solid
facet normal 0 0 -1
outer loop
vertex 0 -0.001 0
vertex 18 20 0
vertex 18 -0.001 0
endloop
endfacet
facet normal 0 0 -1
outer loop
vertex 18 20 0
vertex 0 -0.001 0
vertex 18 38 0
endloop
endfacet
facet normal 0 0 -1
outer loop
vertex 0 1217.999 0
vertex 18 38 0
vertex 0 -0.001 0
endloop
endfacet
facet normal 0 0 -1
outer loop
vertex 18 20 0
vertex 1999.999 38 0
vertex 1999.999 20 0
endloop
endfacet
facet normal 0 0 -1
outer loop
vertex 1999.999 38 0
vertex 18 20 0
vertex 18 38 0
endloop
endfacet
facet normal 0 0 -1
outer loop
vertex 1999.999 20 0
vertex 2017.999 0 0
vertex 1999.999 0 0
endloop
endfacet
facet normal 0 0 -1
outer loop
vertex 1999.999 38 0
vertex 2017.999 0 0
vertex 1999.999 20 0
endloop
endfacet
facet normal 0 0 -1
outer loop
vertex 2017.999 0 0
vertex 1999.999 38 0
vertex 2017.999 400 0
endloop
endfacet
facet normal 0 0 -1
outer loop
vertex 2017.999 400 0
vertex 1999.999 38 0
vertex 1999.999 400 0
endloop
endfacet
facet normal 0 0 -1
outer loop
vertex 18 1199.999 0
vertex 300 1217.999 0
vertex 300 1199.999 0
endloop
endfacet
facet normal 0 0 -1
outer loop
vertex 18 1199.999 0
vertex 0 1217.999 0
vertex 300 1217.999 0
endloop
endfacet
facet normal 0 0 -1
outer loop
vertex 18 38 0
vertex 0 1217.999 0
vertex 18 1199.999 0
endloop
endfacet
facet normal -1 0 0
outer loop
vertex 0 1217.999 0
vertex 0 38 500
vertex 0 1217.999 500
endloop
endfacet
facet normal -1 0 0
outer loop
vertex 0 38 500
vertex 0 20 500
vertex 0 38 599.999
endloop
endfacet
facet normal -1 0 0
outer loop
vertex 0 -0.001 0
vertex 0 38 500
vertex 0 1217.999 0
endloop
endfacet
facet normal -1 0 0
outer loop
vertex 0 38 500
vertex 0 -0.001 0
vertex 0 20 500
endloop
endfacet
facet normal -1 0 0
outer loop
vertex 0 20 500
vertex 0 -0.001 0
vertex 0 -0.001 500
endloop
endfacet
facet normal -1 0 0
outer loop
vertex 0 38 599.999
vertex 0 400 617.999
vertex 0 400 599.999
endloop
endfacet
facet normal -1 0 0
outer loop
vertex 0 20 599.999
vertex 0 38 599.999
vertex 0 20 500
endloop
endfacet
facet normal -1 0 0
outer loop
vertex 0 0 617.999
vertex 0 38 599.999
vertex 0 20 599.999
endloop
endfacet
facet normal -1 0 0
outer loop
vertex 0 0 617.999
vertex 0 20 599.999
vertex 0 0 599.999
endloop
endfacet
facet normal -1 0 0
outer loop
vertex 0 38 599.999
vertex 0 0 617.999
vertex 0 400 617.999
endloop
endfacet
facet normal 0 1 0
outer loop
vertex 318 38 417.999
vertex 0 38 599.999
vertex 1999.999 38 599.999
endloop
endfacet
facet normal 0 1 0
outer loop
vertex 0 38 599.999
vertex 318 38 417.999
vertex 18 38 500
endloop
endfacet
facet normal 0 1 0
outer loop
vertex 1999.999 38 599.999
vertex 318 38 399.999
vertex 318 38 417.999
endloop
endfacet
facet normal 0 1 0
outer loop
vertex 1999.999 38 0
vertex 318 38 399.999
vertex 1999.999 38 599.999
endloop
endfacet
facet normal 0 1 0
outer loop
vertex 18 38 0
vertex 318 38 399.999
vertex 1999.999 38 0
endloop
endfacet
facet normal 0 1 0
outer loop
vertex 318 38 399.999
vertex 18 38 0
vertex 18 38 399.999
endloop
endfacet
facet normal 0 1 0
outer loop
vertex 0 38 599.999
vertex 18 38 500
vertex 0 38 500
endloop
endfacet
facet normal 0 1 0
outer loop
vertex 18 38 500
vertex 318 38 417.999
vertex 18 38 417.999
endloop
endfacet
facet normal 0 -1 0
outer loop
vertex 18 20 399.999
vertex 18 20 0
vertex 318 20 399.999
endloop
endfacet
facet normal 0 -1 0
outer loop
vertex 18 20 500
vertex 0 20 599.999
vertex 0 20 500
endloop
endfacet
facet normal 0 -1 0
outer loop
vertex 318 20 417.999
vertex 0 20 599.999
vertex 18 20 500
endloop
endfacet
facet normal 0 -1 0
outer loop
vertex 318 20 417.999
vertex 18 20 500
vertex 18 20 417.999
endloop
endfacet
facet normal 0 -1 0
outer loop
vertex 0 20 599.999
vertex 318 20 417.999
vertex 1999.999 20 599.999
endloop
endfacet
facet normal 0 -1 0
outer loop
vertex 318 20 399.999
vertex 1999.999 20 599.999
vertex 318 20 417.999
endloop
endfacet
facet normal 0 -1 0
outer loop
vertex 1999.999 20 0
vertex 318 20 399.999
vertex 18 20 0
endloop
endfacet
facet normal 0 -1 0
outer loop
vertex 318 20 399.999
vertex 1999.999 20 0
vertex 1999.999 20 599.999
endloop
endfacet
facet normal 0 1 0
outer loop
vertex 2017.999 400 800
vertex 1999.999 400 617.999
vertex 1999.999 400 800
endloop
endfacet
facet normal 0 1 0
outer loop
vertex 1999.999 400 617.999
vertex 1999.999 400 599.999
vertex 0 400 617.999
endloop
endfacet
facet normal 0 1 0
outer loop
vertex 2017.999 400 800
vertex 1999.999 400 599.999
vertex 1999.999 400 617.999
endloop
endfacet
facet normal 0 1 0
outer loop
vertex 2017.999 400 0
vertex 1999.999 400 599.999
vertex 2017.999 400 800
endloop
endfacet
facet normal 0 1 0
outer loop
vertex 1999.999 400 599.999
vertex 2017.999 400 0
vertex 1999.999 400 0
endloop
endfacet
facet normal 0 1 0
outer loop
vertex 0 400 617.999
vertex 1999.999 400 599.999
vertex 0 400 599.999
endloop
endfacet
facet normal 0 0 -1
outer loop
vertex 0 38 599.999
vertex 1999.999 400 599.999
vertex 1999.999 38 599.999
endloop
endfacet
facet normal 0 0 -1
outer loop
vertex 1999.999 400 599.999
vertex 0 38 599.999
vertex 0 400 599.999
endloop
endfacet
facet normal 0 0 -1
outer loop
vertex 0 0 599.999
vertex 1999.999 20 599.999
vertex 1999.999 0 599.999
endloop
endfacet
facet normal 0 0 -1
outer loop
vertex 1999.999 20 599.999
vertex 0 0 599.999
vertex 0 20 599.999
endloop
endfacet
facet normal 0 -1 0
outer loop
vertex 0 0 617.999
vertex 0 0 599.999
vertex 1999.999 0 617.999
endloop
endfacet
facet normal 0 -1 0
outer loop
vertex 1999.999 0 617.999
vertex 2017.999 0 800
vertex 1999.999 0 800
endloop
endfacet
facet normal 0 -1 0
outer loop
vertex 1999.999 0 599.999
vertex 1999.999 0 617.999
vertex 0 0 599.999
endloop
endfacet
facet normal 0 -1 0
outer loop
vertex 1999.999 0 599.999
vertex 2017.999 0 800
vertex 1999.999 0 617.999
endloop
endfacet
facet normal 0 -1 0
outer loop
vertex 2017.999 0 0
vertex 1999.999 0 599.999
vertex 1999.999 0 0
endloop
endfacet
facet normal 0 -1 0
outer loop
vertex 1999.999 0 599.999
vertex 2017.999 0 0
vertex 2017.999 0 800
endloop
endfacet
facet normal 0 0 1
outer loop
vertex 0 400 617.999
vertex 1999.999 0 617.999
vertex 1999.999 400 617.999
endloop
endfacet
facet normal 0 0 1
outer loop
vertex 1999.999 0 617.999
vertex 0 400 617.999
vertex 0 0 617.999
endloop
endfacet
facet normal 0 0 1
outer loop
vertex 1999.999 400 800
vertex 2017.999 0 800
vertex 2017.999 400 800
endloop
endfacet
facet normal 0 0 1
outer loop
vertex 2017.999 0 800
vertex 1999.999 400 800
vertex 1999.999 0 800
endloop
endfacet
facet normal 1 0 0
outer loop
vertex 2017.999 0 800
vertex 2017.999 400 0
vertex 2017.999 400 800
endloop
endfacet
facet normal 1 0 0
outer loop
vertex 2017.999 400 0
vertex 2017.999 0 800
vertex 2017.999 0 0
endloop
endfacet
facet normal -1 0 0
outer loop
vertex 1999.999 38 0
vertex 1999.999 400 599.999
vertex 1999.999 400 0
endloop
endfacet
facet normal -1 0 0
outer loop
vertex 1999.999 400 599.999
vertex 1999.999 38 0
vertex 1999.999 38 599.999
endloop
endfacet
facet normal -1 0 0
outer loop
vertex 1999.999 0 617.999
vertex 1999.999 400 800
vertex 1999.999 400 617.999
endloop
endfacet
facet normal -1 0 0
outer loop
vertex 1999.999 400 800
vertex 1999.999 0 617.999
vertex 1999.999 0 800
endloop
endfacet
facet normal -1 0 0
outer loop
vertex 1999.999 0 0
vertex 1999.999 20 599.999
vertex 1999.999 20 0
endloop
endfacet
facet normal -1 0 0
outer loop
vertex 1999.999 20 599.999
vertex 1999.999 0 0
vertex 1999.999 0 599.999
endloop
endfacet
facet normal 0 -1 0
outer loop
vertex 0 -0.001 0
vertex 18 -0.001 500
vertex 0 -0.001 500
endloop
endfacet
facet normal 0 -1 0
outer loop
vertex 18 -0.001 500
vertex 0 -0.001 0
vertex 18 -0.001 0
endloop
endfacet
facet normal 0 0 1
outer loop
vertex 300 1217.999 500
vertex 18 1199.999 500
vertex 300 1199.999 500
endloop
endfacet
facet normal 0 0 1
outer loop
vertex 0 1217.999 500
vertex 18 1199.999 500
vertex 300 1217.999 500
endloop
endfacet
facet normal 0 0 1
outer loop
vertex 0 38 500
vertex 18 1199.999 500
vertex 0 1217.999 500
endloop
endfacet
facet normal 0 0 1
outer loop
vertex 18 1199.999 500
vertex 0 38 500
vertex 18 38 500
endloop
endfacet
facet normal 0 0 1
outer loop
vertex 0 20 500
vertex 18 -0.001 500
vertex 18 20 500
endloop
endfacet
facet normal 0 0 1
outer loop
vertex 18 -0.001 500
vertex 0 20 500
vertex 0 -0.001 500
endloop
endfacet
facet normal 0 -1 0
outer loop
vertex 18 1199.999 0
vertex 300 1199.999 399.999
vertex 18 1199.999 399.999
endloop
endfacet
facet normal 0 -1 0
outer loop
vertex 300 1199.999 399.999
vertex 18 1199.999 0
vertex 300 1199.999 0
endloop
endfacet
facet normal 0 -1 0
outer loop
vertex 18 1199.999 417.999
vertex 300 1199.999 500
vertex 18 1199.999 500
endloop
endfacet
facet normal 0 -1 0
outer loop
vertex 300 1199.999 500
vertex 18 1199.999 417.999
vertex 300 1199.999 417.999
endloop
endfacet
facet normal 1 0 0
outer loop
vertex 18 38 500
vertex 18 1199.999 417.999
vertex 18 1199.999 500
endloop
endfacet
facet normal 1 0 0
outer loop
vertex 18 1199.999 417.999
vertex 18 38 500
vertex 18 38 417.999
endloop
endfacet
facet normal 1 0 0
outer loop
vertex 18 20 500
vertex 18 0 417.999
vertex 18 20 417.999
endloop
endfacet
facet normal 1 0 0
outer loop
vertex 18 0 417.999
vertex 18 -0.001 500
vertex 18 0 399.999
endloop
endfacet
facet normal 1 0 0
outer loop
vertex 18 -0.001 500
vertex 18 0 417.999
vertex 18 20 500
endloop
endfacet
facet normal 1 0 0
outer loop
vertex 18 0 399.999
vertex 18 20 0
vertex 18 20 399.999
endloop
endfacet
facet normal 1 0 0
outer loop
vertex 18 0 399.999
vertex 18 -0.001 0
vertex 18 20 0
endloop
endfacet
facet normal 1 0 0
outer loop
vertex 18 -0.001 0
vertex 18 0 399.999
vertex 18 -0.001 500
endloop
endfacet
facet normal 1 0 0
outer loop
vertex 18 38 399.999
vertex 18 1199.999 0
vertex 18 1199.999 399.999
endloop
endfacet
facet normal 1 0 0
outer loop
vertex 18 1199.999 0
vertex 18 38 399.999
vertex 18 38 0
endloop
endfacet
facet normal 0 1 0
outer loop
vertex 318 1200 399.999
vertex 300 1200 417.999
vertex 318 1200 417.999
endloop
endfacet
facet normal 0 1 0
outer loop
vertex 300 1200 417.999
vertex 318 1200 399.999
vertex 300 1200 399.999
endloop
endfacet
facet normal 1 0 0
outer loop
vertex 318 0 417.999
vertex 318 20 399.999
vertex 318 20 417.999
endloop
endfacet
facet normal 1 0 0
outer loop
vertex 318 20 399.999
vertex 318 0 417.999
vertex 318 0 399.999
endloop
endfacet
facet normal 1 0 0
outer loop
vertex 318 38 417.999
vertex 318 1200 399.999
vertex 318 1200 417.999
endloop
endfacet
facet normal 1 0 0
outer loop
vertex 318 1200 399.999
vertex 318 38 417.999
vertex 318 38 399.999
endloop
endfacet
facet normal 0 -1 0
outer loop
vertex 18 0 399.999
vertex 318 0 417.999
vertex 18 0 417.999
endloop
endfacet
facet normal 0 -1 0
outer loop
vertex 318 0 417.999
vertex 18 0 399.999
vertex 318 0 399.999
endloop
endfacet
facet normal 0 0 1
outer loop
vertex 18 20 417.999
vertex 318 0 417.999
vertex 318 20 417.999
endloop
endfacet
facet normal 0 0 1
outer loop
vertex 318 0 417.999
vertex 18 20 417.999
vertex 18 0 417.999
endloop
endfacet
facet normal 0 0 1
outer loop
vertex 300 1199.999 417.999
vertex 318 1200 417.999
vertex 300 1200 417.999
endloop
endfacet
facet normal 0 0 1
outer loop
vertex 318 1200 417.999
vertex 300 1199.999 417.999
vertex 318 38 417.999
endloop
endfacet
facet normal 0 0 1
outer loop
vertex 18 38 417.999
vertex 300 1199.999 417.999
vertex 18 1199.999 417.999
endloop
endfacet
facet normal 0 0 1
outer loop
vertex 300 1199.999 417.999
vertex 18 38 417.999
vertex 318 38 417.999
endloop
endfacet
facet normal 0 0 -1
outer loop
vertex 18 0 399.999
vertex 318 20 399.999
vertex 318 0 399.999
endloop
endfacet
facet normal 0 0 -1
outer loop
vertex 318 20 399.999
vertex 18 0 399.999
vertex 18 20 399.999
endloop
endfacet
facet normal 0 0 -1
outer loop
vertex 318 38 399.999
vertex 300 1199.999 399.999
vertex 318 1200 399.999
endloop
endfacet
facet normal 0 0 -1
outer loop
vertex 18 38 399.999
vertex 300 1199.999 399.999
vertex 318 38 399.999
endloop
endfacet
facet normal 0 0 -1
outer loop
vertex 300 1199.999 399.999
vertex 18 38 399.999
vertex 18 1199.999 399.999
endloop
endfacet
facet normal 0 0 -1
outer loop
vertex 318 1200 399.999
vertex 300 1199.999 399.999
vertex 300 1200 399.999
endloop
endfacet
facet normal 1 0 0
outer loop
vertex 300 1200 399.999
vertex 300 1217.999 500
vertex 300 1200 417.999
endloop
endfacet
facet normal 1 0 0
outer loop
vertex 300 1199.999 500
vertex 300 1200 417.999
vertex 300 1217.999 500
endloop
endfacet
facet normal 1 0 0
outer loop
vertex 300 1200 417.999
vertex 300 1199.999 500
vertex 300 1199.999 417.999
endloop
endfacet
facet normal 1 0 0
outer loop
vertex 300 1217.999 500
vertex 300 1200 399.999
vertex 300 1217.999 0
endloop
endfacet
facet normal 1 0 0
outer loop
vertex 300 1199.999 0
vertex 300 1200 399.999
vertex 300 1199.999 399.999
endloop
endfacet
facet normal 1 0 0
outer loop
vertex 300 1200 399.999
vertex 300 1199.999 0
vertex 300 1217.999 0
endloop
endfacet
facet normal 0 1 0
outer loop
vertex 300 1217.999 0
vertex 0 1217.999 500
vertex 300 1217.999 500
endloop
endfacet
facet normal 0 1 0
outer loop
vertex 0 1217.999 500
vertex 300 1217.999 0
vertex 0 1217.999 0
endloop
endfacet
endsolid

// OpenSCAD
// factory parts

main_back_x=2000;
main_back_z=600;
main_top_z=400;
main_top_y=18;

side_back_x=1200;
side_back_z=500;
side_top_y=18;

margin_on_side=100;


module p2000_600_18(){
    cube([ 
        main_back_x,         // x
        18,           // y
        main_back_z   // z
        ], center=false);
}

module p800_400_18(){
    cube([
        800,  // x
        18, // y
        main_top_z  // z
        ], center=false);
}

module p2000_400_18(){
    cube([
        main_back_x,  // x
        main_top_y, // y
        main_top_z  // z
        ], center=false);
}

module p1200_500_18(){
    cube([
        side_back_x,  // x
        side_top_y, // y
        side_back_z  // z
        ], center=false);
}

module p1200_300_18(){
    cube([
        side_back_x,  // x
        18, // y
        300  // z
        ], center=false);
}

module p500_300_18(){
    cube([
        side_back_z,  // x
        18, // y
        300  // z
        ], center=false);
}

// REMINDERS
// - subtract 0.001 units to guarantee items form a single object
// - rotate first, translate later
// - buld pieces centered so rotation is more intuitive
// - increase resolution using
//     $fa = 1;
//     $fs = 0.4;

module main_back(){
  color("red")    
    p2000_600_18();
}

module main_top(){
  color("white")    
    p2000_400_18();
}

module main_left(){
  color("green")    
    p800_400_18();
}

module side_back(){
  color("green")    
    p1200_500_18();
}

module side_top(){
  color("cyan")    
    p1200_300_18();
}

module side_right(){
  color("red")    
    p500_300_18();
}

module main() {
  translate([0, 20, 0])
    main_back();
  translate([0, 0, main_back_z + main_top_y - 0.001])
    rotate([-90, 0, 0])  
      main_top();
  translate([main_back_x-0.001, 0, 0])
    rotate([0, -90, -90])  
      main_left();  
}
module side() {   
  translate([0, side_back_x  - 0.001, 0])
    rotate([0, 0, -90])  
      side_back();
  translate([side_top_y, 0, side_back_z - margin_on_side  - 0.001])
    rotate([90, 0, 90])  
      side_top();
  translate([0, side_back_x + side_top_y - 0.001, 0])
    rotate([0, -90, 180])  
      side_right();  
}
module full() {   
  main();
  side();
}

full();
